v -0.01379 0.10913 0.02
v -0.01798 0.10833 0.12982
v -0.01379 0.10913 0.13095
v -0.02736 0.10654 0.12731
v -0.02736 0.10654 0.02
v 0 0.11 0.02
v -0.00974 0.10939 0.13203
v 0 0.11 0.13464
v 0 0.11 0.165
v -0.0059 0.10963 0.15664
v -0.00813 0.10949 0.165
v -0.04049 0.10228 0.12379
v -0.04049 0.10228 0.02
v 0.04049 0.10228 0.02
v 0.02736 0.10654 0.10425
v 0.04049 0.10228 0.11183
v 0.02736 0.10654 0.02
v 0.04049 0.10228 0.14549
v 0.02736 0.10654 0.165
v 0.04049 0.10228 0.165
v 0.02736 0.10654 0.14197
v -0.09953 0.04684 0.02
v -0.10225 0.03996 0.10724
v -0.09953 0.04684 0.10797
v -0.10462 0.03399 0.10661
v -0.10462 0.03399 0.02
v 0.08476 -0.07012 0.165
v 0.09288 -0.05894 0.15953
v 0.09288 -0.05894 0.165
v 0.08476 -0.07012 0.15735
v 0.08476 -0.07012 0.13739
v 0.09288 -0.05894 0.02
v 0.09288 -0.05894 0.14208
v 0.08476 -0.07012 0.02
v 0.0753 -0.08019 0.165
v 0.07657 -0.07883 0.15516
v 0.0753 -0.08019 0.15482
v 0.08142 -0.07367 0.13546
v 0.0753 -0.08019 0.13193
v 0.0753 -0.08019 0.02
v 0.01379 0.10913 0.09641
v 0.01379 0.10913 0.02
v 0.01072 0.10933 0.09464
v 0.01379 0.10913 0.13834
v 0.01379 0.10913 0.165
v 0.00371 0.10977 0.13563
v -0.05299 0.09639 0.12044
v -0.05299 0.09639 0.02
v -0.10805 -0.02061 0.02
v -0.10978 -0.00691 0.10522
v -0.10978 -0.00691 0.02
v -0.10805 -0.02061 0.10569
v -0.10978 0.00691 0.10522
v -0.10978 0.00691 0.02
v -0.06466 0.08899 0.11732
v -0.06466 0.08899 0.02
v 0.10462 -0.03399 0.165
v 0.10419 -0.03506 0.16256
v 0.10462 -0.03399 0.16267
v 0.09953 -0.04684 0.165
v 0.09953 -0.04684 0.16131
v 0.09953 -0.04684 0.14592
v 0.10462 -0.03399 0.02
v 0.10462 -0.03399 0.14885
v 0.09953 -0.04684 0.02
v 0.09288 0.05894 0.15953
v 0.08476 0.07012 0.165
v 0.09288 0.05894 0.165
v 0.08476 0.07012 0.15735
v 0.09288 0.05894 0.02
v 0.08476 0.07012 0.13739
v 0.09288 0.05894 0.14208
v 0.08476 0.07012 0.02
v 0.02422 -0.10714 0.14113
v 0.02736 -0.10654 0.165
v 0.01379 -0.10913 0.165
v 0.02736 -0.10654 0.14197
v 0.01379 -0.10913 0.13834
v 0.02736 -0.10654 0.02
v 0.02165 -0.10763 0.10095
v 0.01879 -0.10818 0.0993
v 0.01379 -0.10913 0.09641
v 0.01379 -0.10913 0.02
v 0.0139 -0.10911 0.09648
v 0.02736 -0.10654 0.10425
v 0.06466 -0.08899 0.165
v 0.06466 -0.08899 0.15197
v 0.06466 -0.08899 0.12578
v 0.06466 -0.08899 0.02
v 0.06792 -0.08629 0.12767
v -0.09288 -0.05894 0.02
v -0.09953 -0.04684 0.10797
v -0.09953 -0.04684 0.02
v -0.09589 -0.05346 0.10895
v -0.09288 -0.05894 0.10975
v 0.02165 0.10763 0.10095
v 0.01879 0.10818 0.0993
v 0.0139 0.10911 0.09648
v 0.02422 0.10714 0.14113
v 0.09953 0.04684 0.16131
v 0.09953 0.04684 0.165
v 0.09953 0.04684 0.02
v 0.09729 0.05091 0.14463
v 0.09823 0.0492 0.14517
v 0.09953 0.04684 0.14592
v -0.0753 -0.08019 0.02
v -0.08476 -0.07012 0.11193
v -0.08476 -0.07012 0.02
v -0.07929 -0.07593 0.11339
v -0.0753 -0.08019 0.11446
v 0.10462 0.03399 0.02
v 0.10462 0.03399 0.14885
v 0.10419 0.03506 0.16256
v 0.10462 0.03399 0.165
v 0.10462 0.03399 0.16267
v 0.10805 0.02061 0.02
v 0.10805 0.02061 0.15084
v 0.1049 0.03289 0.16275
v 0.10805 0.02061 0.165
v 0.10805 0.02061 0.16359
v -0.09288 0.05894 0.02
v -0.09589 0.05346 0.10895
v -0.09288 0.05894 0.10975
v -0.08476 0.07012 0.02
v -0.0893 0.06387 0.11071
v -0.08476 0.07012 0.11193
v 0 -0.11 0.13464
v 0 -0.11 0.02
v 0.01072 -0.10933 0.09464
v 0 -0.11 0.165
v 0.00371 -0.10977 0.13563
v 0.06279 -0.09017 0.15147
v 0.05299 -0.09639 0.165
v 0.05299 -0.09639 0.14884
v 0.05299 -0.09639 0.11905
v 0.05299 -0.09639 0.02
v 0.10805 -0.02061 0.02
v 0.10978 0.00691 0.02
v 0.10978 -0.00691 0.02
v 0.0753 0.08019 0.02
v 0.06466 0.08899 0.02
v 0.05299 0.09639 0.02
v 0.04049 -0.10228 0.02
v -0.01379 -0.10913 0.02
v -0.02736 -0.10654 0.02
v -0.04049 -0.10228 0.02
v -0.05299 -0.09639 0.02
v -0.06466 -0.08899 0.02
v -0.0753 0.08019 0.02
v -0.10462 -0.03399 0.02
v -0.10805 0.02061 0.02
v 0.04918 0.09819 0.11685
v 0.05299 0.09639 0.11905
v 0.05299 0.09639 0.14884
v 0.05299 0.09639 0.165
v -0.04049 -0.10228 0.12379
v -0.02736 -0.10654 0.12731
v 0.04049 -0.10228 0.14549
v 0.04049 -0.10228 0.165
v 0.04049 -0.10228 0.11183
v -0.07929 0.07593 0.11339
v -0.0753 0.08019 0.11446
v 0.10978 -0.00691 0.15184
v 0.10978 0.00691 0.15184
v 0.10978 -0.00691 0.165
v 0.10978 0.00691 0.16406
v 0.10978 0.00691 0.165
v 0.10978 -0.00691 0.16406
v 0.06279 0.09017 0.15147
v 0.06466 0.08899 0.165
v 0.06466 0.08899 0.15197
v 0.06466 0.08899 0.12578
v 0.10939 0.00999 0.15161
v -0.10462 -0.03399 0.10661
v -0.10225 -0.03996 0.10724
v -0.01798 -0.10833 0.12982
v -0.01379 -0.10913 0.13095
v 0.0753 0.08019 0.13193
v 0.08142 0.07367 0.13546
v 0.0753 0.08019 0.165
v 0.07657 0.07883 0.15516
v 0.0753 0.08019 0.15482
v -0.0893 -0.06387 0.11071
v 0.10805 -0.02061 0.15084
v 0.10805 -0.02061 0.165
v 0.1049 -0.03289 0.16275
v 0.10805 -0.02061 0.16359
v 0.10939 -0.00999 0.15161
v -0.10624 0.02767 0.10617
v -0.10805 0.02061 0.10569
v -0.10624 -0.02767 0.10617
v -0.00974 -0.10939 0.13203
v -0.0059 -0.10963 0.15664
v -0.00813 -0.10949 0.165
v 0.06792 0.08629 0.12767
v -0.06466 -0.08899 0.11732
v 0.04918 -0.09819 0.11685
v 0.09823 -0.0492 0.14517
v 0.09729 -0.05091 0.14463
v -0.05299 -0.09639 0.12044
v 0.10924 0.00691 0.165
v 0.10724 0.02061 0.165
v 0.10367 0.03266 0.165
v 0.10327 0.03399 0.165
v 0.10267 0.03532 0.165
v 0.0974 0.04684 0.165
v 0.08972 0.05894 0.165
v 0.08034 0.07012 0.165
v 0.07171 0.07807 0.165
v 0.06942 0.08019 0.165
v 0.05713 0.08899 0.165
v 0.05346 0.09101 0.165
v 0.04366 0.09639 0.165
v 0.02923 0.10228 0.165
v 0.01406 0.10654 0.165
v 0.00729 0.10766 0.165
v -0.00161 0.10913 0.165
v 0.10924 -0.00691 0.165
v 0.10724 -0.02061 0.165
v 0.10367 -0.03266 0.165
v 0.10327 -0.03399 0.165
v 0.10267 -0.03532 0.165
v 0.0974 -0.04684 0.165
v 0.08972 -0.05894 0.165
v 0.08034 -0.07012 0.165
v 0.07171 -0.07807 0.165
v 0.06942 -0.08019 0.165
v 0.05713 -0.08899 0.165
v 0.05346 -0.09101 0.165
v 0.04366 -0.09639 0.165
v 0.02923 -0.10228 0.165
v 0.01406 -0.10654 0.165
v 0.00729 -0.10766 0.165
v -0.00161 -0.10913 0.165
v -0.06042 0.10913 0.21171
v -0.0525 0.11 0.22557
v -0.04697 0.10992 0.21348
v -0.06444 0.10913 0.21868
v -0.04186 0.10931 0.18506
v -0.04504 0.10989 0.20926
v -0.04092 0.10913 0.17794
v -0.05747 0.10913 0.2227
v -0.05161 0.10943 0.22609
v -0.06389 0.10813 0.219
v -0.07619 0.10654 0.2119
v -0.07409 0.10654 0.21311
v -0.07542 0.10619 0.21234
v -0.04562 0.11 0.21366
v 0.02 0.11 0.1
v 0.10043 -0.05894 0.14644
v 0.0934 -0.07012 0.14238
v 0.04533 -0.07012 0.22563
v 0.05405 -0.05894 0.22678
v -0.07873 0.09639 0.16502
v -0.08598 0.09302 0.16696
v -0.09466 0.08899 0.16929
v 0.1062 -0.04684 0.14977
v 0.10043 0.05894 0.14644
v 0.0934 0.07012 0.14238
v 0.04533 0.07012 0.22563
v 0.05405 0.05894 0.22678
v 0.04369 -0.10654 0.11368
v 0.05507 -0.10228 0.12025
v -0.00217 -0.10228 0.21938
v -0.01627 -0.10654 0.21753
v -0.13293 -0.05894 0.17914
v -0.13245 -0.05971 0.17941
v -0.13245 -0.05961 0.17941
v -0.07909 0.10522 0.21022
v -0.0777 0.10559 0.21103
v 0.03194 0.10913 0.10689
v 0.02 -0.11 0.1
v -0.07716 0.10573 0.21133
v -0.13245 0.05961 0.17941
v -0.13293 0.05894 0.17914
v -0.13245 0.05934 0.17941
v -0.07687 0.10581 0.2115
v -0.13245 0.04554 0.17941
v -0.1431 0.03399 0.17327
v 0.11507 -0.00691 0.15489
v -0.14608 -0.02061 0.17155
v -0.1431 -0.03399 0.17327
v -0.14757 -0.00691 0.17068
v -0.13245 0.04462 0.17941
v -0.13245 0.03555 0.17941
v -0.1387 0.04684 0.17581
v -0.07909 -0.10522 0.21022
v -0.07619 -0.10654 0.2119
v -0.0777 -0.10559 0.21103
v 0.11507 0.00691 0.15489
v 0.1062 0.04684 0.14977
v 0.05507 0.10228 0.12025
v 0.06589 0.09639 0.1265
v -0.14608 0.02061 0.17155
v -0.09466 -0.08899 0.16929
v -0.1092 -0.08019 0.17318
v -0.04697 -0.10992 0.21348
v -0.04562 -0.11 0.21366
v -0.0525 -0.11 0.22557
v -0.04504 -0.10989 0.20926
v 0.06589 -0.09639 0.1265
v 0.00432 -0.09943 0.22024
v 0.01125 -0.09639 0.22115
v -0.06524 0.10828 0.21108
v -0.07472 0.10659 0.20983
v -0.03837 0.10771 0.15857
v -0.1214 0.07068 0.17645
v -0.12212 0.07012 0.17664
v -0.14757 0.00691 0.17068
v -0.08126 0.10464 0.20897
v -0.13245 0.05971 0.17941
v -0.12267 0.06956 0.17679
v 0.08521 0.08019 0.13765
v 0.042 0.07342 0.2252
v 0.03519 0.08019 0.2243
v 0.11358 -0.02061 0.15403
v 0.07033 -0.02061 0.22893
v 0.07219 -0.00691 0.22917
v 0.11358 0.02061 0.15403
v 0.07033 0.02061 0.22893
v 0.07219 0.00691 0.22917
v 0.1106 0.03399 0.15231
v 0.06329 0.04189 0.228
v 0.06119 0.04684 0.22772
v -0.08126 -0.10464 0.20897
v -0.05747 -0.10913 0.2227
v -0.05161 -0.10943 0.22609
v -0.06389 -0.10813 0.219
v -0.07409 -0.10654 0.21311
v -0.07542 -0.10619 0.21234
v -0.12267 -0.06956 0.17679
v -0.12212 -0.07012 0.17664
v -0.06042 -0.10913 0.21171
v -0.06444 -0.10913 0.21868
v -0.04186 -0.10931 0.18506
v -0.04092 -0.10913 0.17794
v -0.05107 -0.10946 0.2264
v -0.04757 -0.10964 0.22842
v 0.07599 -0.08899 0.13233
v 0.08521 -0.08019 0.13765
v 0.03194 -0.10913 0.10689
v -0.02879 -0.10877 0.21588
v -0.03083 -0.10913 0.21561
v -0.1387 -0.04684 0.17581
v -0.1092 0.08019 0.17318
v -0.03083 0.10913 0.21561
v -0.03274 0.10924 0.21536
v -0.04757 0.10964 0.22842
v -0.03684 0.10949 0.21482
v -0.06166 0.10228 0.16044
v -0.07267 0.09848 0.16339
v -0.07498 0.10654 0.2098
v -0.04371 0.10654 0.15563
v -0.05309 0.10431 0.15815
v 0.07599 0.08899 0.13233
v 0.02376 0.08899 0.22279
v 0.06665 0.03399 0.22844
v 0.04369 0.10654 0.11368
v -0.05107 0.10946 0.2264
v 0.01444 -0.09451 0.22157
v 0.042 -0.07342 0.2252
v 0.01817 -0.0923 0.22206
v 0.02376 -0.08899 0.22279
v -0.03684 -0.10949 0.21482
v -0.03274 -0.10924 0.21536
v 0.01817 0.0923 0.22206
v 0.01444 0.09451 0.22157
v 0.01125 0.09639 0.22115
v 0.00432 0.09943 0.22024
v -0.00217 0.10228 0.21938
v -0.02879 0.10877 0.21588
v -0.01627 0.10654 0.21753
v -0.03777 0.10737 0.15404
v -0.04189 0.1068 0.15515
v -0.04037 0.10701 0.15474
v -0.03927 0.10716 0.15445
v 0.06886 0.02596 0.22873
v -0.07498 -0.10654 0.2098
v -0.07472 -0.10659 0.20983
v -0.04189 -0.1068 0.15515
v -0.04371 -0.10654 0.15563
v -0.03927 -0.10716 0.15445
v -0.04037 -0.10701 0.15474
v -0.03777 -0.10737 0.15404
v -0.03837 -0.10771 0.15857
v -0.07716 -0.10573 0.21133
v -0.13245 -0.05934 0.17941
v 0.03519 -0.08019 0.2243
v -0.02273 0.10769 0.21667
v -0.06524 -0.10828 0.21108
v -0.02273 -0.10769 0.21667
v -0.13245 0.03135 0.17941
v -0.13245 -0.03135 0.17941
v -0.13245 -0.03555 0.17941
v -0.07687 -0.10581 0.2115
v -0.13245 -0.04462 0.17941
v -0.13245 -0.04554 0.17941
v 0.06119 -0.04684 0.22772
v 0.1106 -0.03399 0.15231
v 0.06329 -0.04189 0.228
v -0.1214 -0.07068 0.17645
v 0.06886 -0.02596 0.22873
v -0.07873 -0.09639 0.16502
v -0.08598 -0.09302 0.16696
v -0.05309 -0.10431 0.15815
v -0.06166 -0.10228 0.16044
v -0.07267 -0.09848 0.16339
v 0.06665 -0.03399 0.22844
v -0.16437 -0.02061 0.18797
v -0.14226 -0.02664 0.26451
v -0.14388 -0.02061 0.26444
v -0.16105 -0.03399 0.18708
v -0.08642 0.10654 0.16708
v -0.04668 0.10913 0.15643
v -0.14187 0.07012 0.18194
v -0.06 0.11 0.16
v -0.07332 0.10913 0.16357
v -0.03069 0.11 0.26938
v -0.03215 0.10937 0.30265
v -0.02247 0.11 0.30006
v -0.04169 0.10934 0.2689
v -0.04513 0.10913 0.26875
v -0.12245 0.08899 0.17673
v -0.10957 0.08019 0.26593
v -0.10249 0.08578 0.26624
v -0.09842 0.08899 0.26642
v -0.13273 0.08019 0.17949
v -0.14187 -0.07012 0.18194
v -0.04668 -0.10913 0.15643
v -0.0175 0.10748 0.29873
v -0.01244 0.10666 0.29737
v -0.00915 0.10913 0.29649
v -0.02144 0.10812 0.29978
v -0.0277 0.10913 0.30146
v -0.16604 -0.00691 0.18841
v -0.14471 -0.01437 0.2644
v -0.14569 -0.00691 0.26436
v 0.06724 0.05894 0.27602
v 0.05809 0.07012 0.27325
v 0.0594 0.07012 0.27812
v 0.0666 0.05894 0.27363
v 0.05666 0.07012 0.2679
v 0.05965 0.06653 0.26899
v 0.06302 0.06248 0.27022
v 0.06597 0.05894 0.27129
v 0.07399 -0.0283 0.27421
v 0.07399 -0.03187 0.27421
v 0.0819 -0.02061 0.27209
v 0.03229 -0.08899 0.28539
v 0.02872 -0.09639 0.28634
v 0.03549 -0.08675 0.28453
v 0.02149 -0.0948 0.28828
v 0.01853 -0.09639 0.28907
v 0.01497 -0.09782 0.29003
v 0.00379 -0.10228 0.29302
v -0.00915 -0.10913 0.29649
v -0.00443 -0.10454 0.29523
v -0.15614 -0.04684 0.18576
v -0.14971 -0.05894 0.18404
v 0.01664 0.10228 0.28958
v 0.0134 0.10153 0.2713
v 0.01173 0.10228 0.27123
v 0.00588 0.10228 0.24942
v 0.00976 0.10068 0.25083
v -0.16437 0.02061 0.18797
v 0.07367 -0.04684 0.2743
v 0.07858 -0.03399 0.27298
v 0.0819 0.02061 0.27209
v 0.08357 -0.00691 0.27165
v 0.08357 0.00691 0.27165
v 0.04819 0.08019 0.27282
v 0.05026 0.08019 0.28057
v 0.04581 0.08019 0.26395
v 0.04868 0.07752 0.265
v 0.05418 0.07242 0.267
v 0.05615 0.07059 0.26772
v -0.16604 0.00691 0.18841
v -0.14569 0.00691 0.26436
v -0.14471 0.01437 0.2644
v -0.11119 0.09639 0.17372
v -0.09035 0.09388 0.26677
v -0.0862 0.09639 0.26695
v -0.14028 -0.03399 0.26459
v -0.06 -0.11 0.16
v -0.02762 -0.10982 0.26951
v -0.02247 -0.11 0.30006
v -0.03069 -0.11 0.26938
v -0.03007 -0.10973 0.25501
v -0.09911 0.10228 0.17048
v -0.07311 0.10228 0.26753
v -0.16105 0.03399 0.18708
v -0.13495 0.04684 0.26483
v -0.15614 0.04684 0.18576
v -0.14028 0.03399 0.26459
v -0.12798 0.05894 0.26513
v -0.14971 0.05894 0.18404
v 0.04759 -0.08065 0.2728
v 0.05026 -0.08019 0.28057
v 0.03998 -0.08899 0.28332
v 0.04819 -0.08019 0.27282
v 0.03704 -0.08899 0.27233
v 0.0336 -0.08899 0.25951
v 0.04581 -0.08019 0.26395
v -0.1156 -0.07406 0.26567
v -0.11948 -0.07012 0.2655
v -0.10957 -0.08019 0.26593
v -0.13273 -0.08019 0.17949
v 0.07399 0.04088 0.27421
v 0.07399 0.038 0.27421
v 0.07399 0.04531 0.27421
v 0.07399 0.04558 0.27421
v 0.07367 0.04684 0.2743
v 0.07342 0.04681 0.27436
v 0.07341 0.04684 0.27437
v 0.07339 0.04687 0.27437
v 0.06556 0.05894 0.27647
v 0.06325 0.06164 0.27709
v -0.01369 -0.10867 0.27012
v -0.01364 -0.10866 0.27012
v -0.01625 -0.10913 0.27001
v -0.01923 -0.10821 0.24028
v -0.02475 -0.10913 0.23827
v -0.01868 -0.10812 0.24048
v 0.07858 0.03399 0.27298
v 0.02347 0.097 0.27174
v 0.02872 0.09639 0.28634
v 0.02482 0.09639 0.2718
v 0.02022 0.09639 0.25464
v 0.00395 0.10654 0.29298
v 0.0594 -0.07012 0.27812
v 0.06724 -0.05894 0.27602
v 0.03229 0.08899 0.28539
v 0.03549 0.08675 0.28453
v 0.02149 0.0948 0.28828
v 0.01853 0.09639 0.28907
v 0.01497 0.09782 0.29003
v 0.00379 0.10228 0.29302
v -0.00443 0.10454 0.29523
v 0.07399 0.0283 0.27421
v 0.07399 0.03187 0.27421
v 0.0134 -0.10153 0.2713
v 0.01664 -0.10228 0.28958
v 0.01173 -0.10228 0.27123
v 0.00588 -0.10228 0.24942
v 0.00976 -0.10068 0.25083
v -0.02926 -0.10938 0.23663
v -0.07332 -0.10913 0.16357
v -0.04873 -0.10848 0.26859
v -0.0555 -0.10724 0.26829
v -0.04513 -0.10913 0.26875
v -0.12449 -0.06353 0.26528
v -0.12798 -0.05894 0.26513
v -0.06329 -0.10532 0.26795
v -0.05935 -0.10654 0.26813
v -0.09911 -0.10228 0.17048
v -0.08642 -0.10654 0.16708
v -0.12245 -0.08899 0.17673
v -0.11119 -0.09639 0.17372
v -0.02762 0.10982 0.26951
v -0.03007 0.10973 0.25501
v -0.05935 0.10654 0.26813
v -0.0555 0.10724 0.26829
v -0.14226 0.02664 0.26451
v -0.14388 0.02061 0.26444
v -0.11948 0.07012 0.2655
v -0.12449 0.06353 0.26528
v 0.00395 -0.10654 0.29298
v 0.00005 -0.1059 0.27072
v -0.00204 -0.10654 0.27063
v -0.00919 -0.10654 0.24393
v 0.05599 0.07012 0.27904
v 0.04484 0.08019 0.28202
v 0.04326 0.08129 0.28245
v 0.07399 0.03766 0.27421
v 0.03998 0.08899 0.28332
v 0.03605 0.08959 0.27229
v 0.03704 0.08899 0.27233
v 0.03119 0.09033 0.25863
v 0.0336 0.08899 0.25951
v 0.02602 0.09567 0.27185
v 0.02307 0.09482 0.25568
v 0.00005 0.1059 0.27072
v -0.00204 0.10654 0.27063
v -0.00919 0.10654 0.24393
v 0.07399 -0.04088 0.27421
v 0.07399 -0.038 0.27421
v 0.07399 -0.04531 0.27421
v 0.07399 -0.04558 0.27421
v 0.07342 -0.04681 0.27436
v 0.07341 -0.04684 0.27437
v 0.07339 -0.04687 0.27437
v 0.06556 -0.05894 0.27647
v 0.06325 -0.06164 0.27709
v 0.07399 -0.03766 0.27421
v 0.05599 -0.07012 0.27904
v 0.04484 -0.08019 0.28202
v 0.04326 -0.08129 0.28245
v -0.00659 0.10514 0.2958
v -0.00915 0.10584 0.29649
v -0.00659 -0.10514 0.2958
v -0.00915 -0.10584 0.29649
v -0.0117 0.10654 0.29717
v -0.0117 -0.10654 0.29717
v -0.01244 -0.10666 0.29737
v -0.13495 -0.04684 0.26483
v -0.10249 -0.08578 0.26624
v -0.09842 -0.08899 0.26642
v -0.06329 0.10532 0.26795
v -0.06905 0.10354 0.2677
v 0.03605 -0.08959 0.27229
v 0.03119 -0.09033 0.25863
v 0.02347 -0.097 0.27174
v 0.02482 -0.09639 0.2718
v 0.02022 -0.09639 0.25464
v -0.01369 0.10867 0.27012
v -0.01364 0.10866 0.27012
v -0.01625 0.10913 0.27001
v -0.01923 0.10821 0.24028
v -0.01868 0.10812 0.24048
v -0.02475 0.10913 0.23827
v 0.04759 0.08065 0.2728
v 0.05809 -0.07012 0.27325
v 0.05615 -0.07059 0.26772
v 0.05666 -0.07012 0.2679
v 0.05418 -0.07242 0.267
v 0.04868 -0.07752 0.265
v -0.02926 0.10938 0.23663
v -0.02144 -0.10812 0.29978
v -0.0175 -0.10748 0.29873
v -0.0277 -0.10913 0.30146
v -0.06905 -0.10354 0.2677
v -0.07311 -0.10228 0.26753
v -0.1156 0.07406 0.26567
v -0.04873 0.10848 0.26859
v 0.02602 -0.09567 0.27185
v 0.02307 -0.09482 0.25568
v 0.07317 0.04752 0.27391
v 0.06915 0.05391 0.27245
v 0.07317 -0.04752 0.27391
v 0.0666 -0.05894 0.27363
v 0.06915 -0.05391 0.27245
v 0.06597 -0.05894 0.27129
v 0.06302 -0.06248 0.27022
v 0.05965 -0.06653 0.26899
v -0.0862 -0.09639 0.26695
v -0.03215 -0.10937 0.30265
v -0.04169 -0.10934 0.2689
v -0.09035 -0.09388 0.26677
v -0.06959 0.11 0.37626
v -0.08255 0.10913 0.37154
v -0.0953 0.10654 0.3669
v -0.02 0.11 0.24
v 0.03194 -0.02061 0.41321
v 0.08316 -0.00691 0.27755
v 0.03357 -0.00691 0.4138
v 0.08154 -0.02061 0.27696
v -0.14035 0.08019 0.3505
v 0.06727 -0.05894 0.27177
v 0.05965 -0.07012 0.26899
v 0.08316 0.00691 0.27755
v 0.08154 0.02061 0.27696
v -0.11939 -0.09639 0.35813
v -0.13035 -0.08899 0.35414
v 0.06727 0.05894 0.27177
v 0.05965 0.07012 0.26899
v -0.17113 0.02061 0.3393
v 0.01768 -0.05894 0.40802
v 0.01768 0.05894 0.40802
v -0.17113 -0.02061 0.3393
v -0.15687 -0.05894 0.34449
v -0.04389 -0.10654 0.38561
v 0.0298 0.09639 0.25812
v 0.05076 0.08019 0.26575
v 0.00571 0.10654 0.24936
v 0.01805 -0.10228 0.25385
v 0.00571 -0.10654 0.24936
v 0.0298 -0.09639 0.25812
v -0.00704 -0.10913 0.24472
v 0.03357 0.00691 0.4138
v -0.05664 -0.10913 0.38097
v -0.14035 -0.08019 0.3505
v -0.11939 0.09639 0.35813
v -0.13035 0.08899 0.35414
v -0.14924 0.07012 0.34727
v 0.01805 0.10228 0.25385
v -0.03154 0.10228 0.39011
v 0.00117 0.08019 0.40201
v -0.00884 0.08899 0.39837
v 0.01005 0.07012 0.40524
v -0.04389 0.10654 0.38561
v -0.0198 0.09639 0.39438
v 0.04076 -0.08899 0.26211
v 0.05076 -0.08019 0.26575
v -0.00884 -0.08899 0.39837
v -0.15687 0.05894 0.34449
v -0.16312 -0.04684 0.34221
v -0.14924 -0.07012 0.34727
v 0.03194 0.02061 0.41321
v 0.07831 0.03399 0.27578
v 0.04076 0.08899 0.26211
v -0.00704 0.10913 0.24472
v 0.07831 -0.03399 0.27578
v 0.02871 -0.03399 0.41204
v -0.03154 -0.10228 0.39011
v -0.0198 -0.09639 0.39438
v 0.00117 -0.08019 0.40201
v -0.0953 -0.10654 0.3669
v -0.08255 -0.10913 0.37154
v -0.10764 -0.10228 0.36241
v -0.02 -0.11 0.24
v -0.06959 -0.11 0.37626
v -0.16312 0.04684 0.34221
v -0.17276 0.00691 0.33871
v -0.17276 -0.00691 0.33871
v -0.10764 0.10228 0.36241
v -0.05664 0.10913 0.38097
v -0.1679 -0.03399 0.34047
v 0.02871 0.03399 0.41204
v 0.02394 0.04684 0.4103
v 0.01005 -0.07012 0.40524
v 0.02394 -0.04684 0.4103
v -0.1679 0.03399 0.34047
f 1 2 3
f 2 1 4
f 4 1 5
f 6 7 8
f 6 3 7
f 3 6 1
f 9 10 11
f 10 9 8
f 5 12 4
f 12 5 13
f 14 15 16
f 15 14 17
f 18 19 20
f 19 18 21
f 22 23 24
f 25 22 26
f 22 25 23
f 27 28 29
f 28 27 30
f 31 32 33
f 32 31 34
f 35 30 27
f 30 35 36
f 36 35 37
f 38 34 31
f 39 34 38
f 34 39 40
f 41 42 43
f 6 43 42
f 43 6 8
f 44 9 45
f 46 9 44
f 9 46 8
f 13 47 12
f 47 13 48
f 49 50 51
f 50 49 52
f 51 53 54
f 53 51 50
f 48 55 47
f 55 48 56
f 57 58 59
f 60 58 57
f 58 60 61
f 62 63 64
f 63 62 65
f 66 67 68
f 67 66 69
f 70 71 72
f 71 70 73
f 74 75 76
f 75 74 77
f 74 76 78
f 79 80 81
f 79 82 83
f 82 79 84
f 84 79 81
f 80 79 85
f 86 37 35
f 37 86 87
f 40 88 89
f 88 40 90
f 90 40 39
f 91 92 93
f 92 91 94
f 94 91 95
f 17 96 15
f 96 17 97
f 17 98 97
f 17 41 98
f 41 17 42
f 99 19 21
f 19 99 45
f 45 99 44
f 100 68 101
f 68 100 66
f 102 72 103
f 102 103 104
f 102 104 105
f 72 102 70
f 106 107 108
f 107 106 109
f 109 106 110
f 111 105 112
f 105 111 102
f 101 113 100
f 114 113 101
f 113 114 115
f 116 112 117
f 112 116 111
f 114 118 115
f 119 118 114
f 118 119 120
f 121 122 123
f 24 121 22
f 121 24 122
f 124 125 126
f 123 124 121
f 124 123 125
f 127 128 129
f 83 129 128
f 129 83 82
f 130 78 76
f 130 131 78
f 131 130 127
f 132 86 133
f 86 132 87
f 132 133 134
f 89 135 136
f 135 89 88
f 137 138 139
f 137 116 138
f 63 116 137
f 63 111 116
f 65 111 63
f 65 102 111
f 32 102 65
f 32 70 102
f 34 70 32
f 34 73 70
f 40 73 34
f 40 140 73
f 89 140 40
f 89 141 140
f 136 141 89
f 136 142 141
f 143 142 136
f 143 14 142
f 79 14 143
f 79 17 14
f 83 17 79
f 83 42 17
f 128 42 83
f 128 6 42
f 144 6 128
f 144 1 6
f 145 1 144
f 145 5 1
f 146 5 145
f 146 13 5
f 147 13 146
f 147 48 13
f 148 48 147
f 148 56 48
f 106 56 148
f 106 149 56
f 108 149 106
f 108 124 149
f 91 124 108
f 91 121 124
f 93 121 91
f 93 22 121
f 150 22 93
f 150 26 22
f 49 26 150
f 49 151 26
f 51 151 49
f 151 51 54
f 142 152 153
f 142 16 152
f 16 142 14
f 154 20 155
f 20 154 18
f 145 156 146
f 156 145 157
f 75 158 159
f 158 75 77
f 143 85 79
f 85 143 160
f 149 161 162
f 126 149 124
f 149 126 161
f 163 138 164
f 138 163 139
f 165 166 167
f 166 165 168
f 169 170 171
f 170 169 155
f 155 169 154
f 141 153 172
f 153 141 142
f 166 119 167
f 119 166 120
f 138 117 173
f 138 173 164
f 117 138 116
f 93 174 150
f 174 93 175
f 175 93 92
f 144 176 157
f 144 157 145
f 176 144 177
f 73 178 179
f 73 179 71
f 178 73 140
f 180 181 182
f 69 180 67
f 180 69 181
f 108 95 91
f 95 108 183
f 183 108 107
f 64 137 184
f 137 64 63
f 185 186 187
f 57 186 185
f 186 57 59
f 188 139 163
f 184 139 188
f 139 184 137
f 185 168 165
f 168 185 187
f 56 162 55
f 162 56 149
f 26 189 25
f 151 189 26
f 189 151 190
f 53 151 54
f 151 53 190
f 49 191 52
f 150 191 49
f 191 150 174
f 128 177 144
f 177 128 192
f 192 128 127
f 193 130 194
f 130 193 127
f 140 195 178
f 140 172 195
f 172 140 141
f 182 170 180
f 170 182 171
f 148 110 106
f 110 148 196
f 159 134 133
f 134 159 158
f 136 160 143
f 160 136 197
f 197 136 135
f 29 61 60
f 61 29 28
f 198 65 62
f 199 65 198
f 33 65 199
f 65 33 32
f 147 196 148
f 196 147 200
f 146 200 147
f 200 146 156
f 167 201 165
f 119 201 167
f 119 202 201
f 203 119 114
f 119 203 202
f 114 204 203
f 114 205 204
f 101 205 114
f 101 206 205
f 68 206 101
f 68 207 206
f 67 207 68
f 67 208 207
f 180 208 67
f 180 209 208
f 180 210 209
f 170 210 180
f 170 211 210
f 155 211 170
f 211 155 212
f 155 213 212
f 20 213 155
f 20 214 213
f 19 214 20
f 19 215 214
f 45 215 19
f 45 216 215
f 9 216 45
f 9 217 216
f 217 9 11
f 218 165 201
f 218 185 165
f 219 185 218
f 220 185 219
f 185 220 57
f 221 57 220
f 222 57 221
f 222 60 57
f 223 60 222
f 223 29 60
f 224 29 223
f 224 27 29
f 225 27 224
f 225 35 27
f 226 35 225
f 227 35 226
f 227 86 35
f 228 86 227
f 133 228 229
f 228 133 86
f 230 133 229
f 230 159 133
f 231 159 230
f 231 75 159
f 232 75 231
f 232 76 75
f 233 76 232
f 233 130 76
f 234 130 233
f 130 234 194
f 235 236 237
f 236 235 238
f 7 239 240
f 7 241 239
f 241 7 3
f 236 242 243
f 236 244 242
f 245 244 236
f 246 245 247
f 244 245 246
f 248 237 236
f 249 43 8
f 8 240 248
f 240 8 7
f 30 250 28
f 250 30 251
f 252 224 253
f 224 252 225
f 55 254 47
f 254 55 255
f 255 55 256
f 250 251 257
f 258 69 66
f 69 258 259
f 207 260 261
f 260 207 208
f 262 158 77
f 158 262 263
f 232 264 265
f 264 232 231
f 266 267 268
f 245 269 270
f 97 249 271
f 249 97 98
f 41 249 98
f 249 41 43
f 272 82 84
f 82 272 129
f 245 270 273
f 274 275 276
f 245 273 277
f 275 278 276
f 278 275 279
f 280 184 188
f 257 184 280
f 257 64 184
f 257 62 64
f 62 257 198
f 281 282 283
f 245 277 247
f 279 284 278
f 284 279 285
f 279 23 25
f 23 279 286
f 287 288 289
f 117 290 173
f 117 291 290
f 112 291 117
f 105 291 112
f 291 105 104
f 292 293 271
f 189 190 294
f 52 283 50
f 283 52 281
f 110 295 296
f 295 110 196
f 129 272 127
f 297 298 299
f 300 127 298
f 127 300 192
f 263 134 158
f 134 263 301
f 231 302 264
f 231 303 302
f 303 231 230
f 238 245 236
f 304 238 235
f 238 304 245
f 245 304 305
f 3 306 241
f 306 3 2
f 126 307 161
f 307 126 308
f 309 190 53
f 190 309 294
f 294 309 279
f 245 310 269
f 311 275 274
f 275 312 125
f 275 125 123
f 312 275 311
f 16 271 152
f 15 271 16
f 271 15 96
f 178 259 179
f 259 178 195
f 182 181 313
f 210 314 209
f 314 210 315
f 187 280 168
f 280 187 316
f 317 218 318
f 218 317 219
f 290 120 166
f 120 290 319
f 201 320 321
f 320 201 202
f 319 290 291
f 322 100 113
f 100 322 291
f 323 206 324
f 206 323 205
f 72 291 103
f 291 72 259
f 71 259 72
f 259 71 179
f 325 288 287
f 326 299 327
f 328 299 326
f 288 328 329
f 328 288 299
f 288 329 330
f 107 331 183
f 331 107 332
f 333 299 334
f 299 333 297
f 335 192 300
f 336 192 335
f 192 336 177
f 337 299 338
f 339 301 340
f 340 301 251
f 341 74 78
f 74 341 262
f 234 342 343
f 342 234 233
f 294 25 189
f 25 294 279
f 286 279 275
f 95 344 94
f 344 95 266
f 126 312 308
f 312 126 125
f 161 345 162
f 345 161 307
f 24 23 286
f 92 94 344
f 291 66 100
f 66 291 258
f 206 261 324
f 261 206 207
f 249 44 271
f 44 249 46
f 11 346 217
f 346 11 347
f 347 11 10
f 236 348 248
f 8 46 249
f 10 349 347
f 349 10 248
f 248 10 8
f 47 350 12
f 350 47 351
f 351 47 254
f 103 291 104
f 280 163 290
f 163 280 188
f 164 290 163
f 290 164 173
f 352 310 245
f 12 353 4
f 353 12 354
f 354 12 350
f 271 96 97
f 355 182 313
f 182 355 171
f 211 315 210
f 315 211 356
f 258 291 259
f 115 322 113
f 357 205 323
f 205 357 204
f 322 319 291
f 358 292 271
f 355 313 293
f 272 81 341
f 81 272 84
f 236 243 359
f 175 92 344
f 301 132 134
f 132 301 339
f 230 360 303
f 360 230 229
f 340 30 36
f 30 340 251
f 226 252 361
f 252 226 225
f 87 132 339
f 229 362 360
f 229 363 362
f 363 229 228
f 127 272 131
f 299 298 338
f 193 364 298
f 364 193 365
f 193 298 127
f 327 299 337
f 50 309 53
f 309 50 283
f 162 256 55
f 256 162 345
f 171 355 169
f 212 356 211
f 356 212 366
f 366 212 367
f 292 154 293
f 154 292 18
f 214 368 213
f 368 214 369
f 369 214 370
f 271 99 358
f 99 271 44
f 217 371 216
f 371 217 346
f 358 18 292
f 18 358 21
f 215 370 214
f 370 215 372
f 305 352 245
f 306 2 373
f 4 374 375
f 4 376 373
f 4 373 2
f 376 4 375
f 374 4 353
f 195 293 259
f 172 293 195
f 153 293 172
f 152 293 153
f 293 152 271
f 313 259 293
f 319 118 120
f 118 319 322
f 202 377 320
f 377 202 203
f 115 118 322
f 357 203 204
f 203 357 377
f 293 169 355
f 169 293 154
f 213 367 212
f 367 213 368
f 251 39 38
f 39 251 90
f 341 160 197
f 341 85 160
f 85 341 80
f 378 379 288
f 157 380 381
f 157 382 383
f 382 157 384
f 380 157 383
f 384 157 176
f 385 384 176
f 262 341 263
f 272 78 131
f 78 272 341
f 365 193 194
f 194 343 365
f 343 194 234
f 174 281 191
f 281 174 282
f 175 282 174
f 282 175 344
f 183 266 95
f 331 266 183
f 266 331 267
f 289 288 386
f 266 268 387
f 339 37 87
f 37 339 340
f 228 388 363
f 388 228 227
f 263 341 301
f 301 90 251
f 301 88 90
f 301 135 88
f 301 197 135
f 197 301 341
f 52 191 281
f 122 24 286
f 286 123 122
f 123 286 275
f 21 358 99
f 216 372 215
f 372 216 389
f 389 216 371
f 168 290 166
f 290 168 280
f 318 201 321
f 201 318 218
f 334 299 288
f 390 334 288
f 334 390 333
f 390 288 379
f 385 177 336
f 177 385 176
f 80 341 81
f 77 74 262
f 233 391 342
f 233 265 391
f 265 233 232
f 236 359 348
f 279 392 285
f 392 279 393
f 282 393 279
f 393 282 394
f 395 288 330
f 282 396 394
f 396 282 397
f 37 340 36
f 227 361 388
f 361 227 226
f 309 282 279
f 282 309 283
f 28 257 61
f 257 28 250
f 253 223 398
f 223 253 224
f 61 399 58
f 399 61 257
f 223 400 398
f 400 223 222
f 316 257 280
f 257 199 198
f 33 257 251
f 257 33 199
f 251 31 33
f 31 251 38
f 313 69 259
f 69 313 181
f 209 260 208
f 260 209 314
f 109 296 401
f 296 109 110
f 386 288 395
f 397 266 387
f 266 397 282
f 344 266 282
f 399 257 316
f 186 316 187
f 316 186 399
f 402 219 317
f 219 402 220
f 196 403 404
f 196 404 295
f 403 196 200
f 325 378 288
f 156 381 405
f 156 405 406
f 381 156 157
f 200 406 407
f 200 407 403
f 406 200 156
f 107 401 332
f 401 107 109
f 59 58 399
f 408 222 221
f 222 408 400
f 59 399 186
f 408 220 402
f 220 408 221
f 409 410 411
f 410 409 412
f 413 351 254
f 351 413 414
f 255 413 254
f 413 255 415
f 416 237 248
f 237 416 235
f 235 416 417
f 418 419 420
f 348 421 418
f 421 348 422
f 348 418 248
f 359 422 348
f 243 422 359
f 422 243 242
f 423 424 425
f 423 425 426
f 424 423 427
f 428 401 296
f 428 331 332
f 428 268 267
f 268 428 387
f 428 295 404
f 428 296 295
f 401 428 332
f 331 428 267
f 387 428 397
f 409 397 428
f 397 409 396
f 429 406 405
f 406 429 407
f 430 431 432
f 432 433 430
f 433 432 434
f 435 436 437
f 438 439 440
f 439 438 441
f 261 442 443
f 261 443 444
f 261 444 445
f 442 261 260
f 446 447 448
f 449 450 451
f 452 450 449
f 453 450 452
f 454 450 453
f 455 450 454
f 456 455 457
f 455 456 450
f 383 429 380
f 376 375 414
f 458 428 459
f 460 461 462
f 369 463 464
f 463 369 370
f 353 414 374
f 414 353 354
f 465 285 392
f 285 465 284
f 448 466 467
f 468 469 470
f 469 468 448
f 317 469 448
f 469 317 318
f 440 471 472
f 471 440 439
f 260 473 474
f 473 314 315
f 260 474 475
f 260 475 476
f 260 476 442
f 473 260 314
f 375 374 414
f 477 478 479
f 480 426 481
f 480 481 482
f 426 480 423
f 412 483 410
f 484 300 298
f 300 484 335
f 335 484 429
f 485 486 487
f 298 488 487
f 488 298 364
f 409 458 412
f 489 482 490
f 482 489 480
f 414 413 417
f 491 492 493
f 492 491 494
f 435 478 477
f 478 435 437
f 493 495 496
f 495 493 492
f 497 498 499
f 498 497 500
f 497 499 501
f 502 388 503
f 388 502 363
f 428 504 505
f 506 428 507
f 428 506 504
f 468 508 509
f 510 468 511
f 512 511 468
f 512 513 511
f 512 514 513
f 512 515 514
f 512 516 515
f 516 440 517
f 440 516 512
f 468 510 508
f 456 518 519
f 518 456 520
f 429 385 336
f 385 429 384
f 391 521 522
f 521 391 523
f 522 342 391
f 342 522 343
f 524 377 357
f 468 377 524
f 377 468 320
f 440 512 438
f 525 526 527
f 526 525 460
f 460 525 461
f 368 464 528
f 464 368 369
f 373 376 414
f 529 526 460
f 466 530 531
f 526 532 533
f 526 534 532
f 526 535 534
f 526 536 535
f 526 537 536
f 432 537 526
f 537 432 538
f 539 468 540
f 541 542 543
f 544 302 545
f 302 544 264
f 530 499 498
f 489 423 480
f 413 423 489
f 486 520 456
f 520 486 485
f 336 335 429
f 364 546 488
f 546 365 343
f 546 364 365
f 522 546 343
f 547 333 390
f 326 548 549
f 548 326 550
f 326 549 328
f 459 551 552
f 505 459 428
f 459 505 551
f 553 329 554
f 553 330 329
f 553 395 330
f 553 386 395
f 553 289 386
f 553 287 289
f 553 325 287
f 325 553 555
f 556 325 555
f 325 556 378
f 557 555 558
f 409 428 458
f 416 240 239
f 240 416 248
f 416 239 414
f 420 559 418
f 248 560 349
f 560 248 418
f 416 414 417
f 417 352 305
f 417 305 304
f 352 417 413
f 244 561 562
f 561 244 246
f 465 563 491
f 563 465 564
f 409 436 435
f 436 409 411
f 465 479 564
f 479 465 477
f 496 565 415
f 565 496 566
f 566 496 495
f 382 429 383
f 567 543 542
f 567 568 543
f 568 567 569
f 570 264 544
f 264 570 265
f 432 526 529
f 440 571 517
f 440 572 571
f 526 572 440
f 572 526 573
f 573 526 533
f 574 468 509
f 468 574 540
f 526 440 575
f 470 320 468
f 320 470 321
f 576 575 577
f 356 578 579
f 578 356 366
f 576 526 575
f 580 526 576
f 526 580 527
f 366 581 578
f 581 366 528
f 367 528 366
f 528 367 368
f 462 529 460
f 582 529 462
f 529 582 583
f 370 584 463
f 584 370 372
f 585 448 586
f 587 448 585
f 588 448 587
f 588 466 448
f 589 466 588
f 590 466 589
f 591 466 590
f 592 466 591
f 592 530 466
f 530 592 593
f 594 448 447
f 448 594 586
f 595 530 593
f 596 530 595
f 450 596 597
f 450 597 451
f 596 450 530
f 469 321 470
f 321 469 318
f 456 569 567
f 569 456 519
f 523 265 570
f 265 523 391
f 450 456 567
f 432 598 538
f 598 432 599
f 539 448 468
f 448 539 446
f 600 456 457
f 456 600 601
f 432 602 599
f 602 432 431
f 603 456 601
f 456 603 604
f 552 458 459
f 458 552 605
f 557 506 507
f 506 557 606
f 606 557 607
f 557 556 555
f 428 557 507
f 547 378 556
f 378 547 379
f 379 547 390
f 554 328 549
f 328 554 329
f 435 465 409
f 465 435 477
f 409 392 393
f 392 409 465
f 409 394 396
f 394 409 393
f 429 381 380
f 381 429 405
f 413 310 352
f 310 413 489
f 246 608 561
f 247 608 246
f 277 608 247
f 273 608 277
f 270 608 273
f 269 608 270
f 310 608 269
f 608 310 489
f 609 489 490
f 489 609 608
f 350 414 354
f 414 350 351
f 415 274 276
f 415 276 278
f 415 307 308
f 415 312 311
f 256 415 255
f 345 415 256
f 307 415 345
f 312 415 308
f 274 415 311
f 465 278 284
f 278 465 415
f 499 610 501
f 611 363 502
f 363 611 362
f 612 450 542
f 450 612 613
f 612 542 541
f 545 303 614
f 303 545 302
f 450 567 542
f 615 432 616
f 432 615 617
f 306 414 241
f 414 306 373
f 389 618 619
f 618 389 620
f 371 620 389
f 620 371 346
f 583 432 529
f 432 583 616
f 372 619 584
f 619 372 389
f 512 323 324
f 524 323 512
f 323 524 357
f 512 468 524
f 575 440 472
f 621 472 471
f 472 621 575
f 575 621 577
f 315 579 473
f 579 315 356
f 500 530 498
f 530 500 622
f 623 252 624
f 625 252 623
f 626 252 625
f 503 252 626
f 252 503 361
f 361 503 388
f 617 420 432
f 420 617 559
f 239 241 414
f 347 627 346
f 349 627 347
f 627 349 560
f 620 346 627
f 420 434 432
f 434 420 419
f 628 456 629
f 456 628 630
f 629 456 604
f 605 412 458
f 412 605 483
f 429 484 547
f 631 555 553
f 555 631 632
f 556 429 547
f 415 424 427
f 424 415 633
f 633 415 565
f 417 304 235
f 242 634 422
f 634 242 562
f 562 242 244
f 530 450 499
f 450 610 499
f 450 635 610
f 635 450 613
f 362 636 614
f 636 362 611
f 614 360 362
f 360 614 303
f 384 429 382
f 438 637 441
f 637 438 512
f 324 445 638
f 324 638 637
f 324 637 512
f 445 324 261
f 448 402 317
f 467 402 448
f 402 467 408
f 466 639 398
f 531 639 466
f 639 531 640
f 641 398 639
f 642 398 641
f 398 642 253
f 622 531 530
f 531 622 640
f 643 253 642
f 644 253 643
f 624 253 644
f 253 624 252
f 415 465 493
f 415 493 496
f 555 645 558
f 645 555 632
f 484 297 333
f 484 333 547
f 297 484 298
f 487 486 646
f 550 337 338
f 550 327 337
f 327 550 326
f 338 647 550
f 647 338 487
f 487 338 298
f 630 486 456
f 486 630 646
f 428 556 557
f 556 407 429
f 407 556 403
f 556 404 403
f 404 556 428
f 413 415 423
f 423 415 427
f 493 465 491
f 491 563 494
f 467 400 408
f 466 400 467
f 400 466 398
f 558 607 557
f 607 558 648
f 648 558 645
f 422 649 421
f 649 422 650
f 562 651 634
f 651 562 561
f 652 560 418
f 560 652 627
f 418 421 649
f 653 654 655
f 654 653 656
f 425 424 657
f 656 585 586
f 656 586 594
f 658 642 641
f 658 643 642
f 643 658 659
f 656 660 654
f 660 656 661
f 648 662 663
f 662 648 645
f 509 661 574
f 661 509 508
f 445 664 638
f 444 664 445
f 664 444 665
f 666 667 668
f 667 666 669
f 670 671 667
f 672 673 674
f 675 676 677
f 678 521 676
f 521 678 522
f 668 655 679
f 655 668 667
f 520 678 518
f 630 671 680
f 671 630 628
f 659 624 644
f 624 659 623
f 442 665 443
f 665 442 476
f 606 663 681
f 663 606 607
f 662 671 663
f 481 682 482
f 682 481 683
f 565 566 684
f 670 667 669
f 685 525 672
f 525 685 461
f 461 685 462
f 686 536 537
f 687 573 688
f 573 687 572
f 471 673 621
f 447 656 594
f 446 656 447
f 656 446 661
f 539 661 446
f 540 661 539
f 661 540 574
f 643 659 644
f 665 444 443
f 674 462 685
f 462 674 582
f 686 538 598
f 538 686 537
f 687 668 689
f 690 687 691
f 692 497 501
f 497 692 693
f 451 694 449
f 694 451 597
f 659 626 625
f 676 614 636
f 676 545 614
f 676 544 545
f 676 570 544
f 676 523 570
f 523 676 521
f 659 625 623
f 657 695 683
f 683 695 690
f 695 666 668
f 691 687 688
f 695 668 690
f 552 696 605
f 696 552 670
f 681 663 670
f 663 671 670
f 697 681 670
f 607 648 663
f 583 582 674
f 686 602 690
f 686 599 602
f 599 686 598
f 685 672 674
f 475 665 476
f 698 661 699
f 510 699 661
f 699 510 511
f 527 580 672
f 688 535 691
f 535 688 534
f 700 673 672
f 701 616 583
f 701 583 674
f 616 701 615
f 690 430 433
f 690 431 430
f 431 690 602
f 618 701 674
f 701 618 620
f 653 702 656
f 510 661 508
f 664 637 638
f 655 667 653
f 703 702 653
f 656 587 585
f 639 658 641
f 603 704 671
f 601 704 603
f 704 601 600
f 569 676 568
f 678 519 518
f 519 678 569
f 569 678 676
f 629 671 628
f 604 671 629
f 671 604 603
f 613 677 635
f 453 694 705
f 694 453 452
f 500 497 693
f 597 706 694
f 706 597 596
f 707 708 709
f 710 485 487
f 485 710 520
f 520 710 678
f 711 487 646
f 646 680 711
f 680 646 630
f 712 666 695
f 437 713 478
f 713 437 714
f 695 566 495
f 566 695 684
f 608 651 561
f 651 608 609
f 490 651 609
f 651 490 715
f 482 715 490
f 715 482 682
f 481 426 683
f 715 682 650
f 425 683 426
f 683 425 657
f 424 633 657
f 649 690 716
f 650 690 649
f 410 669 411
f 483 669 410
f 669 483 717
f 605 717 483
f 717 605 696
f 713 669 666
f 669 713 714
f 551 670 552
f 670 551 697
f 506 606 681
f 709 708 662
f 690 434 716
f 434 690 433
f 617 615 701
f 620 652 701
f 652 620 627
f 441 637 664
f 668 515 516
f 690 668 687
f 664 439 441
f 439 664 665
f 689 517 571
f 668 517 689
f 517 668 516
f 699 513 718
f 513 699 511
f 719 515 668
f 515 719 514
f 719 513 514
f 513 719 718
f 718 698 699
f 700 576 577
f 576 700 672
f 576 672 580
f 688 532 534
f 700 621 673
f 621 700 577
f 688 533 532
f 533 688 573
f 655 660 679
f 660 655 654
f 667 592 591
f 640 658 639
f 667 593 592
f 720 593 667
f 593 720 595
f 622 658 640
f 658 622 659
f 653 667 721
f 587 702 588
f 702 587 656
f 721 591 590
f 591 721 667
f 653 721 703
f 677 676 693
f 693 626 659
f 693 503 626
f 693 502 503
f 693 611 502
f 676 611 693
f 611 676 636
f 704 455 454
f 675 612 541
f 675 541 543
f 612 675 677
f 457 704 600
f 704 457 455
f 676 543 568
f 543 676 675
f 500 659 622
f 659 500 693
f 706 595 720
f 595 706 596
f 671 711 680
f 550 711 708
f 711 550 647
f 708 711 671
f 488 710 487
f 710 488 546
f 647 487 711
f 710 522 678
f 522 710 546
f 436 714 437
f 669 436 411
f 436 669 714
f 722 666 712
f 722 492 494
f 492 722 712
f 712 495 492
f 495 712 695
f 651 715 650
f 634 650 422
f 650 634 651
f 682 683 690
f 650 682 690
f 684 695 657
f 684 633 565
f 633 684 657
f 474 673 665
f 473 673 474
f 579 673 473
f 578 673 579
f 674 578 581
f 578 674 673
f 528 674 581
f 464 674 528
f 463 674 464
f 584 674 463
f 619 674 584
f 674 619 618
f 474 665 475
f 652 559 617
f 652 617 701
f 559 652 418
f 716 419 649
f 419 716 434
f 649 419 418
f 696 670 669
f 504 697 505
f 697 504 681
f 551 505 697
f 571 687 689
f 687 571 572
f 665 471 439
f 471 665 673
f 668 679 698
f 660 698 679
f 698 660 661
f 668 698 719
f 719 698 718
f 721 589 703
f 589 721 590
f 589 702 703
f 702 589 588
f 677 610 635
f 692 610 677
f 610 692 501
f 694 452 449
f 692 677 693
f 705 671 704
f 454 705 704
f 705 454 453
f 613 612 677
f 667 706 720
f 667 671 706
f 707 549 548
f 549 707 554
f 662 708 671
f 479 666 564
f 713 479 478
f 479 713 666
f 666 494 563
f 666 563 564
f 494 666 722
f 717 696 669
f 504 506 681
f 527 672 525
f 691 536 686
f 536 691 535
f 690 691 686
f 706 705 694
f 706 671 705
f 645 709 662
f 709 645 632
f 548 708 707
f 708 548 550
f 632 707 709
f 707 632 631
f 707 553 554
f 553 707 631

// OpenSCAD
//referenceCube();
//fakeCounter();
scale([0.01, 0.01, 0.01])
//translate([0, 0, 41]) 

scale([2, 2, 2])

crushedCan();
//closedBeerCan();
//openBeerCan();
//translate([20, 0, 41]) openBeerCan();

//translate([0, 0, 41]) beerCanBox();

showCanOpened = true;
showCanClosed = false;
showPaintedParts = true;
showAluminumParts = false;
showFoam = false;
showCanBox = true;

module beerCanBox() {
    if (showCanBox) {
        if (showCanClosed) {
            //translate([11, 15, 38]) rotate([90, 0, 0]) closedBeerCan();
            translate([17, 15, 37]) rotate([90, 0, 0]) closedBeerCan();
            translate([28, 15, 37]) rotate([90, 0, 0]) closedBeerCan();
            
            translate([-22, 15, 27]) rotate([90, 0, 0]) closedBeerCan();
            translate([-11, 15, 27]) rotate([90, 0, 0]) closedBeerCan();
            translate([0, 15, 27]) rotate([90, 0, 0]) closedBeerCan();
            translate([11, 15, 27]) rotate([90, 0, 0]) closedBeerCan();
            translate([22, 15, 27]) rotate([90, 0, 0]) closedBeerCan();
            translate([33, 15, 27]) rotate([90, 0, 0]) closedBeerCan();
        } else {
            color("white")
            translate([-30, -19, -1])
            difference() {
                cube([70, 36, 45]);
                translate([0.5, 0.5, 0])
                cube([69, 35, 44]);
                translate([46, -0.5, 30])
                cube([25, 37, 44]);
            }
        }

    }
}

module closedBeerCan() {
    canBottom();
    canSideWall();
    canTopClosed();  
}

module openBeerCan() {
    if (showCanOpened) {
        canBottom();
        canSideWall();
        canTopOpen();
        canOpenFoam();
    }
}

module canBottom() {
    if (showAluminumParts) {
        cylinder(d1=10, d2=11, h=1, $fn=50);
    }
}

module canTopClosed() {
    if (showAluminumParts && showCanClosed) {
        translate([0, 0, 30])
        cylinder(d2=10, d1=11, h=1.5, $fn=50);
        
        translate([0, 0, 31.5])
        difference() {
            color("blue")
            cylinder(d=10, h=0.5, $fn=50);
            
            translate([0, 0, -1])
            cylinder(d=9, h=2, $fn=50);
        }
        
        translate([-3/2, 0, 31.5])
        cube([3, 4, 0.5]);
    }
}

module canTopOpen() {
    if (showAluminumParts && showCanOpened) {
        translate([0, 0, 30])
        cylinder(d2=10, d1=11, h=1.5, $fn=50);
        
        translate([0, 0, 31.5])
        difference() {
            color("blue")
            cylinder(d=10, h=0.5, $fn=50);
            
            translate([0, 0, -1])
            cylinder(d=9, h=2, $fn=50);
        }
        
        translate([-3/2, 0, 31.5])
        rotate([90, 0, 0])
        cube([3, 4, 0.5]);
    }
}

module canOpenFoam() {
    if (showFoam) { 
        intersection() {
            union() {
                //translate([0, -7, 28])
                //sphere(d=13);
                
                translate([0, -2, 0])
                cylinder(d=11.1, h=32.5);
                
            }
        
            cylinder(d1=9, d2=15, h=50);
        }
    }
}

module crushedCan() {
    rotate([0, 0, 90])
    if (showPaintedParts) {
        translate([0, 0, 1]) cylinder(d=11, h=29.0/4, $fn=50);
        translate([0, -1, 5]) rotate([-30, 0, 0]) cylinder(d=11, h=29.0/4, $fn=50);
        translate([0, 3, 8]) rotate([15, 0, 0]) cylinder(d=11, h=29.0/4, $fn=50);
        translate([0, 1, 12]) rotate([-20, 0, 0]) cylinder(d=11, h=29.0/4, $fn=50);
    }
    rotate([0, 0, 90])
    if (showAluminumParts) {
        canBottom();
        translate([0, -7, -10])
        rotate([-20, 0, 0])
        canTopOpen();
    }
}

module canSideWall() {
    if (showPaintedParts) {
        translate([0, 0, 1]) cylinder(d=11, h=29.0, $fn=50);
    }
}

module fakeCounter() {
    translate([-50, -50, 0])
    cube([100, 100, 40]);
}

module referenceCube() {
    translate([-50, -200, 0])
    cube([100, 100, 100]);
}
